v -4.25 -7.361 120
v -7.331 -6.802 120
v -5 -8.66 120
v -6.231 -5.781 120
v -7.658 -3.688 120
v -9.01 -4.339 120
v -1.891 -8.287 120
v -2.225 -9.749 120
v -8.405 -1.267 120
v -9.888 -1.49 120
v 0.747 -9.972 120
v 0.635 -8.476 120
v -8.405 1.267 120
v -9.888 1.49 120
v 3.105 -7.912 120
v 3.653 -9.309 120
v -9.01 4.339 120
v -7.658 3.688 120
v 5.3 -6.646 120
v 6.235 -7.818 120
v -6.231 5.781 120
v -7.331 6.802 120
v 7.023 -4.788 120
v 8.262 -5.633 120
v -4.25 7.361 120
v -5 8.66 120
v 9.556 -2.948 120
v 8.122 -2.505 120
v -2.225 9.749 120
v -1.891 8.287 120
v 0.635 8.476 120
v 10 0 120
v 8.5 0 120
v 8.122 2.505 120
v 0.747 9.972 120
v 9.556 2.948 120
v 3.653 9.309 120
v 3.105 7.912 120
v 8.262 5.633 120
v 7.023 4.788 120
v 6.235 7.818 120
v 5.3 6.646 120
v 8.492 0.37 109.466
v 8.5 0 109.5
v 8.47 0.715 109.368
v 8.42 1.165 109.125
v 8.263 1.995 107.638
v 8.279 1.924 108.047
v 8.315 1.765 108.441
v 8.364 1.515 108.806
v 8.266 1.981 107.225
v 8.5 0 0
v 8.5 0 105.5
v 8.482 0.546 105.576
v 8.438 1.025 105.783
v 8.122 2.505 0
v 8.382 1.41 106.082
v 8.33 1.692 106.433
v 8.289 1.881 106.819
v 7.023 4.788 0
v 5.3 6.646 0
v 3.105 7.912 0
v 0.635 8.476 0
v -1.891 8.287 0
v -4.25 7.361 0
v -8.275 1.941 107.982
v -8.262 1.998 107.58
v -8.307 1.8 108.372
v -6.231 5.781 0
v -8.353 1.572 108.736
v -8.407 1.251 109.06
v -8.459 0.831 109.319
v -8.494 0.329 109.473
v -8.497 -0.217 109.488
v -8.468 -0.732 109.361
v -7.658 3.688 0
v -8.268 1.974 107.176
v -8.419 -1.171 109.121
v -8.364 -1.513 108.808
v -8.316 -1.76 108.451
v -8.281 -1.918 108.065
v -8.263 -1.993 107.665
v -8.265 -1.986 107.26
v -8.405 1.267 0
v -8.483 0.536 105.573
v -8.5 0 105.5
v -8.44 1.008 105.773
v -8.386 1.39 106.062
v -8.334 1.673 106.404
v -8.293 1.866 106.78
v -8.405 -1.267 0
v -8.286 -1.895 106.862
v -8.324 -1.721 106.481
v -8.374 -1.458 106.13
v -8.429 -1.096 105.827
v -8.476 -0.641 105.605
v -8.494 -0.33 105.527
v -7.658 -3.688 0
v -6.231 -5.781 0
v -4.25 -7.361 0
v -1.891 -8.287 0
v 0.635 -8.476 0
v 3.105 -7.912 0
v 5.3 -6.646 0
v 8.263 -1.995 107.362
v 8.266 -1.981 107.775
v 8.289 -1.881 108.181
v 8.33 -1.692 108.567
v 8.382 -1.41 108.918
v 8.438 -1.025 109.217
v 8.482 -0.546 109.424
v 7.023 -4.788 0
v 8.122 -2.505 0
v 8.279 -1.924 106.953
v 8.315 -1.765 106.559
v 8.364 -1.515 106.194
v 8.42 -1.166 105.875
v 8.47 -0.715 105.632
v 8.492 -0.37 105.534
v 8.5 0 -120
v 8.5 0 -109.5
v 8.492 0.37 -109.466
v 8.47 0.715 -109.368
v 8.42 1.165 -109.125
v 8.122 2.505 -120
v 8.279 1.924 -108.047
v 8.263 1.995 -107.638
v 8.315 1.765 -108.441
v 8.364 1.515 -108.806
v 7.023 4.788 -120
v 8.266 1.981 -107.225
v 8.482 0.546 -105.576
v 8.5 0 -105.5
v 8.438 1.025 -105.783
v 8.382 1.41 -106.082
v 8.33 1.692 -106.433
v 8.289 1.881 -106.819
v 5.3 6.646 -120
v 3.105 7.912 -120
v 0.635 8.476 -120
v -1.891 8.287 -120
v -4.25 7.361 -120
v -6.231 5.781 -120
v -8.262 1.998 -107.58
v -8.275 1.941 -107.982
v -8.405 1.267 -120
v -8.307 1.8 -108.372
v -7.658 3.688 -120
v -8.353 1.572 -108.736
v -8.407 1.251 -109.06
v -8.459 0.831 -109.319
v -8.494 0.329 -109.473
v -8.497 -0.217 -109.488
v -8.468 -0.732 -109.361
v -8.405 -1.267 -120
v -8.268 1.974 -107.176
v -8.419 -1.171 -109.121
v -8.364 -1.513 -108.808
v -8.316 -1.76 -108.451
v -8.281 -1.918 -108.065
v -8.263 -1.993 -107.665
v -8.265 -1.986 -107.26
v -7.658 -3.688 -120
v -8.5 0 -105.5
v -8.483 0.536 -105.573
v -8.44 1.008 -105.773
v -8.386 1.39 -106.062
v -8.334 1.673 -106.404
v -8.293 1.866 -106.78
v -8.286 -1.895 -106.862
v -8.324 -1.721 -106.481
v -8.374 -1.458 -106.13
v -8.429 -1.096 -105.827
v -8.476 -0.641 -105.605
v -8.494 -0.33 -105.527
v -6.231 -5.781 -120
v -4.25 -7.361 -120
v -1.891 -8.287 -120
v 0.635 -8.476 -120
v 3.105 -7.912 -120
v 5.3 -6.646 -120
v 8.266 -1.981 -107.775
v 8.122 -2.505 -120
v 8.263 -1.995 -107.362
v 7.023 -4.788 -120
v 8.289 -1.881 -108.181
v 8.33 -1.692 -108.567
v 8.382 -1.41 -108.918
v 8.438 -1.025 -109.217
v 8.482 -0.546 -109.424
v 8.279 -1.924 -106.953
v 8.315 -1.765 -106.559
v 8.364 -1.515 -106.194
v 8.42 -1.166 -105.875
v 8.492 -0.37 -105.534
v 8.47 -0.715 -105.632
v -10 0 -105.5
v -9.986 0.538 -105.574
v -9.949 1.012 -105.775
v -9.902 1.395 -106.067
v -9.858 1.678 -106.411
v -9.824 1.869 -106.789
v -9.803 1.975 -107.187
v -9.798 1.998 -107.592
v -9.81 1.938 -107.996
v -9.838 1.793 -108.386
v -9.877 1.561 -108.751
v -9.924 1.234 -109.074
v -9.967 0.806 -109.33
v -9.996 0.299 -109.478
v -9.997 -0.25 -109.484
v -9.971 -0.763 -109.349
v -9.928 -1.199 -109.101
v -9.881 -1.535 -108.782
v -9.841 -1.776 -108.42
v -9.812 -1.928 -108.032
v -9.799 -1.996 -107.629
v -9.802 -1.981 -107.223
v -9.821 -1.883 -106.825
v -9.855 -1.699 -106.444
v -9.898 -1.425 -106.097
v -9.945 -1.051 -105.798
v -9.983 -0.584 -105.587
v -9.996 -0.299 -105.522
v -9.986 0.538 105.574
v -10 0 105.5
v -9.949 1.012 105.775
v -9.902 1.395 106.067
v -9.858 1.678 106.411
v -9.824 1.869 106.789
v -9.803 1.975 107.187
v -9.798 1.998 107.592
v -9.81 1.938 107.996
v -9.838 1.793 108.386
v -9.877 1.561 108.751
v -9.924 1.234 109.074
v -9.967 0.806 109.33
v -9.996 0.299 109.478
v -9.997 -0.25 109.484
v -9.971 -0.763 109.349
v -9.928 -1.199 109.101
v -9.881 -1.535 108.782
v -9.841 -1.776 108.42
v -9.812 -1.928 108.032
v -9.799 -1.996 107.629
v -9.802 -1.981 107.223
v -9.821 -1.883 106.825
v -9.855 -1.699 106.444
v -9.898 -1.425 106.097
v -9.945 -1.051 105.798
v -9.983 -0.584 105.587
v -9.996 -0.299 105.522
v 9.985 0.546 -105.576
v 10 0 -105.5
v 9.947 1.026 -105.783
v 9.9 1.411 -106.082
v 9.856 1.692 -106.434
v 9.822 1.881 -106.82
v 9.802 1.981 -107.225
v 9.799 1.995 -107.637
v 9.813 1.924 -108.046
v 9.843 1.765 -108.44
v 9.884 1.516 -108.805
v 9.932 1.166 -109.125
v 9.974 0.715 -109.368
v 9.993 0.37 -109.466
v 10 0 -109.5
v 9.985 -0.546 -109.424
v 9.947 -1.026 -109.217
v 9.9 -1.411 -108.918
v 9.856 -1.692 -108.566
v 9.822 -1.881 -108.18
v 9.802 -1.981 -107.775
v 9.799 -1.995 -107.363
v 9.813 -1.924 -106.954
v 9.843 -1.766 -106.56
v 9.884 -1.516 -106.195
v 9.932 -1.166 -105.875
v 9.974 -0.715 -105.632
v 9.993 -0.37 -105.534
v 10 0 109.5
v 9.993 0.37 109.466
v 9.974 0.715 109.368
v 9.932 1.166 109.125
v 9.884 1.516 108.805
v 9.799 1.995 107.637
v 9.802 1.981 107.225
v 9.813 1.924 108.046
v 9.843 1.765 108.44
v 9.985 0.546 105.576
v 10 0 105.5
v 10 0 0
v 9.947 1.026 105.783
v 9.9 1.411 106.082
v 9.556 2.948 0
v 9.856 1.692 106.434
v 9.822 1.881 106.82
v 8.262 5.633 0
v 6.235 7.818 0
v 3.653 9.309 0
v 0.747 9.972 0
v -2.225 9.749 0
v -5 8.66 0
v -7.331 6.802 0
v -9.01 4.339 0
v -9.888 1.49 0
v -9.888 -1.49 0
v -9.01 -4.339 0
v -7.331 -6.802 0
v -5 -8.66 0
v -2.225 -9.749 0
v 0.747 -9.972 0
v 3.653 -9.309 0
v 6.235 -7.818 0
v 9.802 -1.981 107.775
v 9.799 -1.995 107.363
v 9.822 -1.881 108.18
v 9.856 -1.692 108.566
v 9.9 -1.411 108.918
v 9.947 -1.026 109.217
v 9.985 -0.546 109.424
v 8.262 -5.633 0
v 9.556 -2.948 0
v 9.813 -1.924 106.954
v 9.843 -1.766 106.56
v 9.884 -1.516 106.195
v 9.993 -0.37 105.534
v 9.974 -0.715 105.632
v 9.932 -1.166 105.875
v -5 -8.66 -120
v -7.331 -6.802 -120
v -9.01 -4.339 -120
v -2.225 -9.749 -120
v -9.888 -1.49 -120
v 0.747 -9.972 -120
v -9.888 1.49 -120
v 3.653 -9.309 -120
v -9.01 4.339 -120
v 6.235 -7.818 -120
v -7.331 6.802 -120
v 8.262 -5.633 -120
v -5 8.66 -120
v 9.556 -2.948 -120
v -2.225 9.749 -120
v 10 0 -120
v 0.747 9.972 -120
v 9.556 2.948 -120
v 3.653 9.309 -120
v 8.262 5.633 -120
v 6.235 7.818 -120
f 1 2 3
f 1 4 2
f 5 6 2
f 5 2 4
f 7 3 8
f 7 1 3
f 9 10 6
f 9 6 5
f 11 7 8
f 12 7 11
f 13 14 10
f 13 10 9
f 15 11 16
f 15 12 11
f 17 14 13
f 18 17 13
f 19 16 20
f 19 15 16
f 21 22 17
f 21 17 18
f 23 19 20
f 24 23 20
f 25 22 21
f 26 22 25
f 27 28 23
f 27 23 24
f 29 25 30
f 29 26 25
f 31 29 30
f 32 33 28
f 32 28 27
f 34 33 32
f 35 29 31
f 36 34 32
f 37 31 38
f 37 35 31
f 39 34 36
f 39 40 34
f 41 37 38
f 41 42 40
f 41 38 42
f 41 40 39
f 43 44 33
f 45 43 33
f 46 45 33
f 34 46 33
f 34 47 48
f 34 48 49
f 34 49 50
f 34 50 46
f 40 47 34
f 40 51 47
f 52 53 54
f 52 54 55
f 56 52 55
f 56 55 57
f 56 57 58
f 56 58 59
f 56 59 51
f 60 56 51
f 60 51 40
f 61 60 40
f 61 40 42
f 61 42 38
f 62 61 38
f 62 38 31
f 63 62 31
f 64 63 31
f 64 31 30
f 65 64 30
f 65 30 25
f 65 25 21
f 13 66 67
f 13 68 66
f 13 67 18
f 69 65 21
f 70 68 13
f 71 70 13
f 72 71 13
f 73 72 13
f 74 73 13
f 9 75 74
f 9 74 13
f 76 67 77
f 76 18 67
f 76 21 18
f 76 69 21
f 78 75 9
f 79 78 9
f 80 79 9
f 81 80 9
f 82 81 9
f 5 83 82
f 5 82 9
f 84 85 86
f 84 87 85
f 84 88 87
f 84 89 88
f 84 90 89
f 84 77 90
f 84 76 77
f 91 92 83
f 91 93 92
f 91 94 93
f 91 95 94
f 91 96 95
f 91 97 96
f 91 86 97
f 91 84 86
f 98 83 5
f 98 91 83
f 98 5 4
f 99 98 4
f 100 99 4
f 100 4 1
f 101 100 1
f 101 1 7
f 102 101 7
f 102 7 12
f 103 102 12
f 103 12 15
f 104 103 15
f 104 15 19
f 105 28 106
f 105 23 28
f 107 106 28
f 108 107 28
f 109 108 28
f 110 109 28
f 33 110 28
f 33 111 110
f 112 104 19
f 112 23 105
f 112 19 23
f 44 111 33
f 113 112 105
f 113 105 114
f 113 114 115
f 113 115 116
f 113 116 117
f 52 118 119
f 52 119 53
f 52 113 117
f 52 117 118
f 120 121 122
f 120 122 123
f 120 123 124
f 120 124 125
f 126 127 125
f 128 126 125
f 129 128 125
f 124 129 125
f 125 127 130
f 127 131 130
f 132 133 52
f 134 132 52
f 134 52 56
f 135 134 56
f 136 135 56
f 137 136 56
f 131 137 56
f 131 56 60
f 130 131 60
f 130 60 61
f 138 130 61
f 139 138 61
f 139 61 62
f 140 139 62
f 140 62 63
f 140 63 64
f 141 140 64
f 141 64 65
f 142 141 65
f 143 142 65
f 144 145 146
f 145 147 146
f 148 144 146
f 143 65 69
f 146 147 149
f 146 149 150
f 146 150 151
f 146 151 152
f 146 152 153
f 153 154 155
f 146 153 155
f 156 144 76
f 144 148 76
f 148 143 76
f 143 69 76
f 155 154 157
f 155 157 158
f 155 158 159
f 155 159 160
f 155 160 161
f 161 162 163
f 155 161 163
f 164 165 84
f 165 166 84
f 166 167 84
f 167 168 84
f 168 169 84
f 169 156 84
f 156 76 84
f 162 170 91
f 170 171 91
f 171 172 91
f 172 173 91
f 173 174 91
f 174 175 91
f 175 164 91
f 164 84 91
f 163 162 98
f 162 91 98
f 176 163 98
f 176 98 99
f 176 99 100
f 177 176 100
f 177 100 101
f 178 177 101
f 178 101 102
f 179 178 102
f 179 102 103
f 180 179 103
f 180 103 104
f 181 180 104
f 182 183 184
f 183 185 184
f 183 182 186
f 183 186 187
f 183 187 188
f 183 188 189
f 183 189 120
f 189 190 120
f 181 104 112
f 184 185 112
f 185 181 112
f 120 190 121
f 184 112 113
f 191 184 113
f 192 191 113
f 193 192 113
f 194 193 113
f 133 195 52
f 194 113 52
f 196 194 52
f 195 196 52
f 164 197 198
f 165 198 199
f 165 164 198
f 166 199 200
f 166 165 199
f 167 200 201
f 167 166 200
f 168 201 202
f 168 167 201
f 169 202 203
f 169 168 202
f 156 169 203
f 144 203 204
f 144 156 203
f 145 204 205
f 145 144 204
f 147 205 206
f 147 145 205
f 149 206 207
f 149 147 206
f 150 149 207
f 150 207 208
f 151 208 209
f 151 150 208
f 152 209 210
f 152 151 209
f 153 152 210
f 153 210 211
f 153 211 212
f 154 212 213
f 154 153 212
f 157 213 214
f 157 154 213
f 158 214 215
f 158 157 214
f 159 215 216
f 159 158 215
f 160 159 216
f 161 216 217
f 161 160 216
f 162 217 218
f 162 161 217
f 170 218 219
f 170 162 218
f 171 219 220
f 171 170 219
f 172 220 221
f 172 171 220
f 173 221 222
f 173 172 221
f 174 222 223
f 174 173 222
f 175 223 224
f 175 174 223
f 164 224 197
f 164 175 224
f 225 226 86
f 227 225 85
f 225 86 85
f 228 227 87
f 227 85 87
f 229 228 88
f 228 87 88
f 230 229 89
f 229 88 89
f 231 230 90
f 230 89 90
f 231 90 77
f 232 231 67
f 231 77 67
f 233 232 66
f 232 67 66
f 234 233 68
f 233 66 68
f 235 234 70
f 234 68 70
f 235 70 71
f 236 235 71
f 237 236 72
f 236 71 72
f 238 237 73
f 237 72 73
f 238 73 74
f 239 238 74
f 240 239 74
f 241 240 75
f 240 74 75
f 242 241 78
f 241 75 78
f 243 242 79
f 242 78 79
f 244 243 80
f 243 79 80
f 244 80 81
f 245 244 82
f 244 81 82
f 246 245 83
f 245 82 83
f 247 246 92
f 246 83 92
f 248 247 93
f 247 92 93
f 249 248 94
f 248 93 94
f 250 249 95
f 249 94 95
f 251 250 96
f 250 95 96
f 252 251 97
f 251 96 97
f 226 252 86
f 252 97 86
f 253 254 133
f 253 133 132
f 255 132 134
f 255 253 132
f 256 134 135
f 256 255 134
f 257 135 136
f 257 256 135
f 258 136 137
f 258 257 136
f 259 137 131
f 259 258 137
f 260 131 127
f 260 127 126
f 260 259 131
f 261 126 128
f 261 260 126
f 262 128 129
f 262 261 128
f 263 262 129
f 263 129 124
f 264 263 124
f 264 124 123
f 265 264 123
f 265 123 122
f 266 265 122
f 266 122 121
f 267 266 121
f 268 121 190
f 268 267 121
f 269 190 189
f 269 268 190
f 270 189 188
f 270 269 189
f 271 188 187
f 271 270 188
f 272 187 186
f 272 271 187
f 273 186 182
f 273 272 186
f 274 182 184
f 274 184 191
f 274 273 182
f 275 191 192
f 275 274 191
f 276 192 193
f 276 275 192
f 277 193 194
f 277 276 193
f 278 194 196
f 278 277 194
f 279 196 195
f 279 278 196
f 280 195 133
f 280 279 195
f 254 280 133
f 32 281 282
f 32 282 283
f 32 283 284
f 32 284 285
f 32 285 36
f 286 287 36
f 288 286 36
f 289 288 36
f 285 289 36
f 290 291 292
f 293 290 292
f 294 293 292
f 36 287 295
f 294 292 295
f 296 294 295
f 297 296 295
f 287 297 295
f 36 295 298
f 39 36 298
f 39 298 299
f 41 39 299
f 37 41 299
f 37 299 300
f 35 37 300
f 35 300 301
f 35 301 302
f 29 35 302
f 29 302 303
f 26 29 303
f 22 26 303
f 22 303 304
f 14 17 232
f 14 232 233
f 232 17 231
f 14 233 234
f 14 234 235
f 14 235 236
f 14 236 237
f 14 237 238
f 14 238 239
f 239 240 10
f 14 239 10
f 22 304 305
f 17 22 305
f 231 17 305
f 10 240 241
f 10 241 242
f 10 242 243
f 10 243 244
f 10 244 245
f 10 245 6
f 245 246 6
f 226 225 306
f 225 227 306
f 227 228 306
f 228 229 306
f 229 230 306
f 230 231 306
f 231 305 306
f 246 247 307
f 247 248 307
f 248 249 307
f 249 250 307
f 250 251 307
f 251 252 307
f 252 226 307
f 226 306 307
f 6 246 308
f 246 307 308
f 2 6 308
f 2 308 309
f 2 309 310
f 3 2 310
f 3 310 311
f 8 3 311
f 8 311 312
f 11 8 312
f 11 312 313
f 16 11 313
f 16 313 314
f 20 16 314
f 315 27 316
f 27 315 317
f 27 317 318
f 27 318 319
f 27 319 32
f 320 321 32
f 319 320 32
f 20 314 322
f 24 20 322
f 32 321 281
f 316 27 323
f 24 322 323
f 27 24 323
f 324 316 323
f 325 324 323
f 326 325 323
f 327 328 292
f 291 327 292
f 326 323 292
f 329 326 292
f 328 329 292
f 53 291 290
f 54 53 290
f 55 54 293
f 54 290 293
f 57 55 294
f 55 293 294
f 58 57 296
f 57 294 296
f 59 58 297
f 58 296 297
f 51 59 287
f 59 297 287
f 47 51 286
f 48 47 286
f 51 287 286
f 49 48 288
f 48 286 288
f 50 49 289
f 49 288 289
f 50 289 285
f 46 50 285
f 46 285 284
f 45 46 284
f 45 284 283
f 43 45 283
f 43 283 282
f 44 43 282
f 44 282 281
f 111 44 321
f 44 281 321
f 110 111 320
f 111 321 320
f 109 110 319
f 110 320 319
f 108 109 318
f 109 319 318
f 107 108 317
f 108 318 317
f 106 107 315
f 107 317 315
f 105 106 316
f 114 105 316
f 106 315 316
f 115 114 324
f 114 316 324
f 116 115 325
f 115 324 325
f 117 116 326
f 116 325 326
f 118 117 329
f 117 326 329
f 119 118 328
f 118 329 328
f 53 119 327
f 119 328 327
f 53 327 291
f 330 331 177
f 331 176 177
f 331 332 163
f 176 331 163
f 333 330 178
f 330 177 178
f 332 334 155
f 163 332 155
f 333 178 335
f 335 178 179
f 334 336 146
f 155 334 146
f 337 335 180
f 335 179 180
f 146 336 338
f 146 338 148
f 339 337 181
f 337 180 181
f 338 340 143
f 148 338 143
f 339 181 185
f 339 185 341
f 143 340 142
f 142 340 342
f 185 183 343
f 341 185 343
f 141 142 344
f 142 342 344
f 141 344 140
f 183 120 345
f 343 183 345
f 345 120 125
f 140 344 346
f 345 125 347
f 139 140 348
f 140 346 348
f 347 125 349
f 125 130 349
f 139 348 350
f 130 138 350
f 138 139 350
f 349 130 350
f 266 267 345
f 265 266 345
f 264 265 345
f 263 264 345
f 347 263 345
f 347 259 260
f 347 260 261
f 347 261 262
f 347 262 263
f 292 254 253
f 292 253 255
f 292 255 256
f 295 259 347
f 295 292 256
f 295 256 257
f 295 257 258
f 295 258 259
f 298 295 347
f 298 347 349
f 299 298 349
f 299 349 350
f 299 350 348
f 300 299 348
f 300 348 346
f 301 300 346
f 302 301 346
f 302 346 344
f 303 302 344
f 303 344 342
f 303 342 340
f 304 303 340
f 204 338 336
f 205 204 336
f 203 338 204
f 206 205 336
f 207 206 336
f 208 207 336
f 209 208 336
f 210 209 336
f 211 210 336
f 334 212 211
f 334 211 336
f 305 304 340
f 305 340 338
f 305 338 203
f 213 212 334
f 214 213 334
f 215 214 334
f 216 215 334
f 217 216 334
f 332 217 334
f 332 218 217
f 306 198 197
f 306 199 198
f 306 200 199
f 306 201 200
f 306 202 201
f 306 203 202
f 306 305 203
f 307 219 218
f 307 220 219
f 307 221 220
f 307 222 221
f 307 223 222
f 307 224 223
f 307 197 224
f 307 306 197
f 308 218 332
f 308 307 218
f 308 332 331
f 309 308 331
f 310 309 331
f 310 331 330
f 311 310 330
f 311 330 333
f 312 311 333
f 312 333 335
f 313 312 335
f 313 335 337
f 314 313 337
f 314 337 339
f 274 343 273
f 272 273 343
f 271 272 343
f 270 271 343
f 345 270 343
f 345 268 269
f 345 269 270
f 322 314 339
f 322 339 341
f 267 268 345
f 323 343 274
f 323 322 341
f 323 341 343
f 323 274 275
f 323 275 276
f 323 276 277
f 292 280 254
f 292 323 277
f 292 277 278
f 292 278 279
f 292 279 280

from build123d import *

# Parameters (mm, degrees)
SKETCH1_R           = 10
SKETCH1_R_2         = 8.5
BOSS_EXTRUDE1_DEPTH = 120
SKETCH2_R           = 2
CUT_EXTRUDE1_DEPTH  = 121.830459736


with BuildPart() as part:
    # Sketch1 → Boss-Extrude1 (new body)
    with BuildSketch(Plane.XY):
        Circle(SKETCH1_R)
        Circle(SKETCH1_R_2, mode=Mode.SUBTRACT)
    boss_extrude1 = extrude(amount=BOSS_EXTRUDE1_DEPTH)

    # Sketch2 → Cut-Extrude1 (cut, symmetric)
    with BuildSketch(Plane(origin=(0, 0, 0), x_dir=(0, 0, -1), z_dir=(1, 0, 0))):
        with Locations((-107.5, 0)):
            Circle(SKETCH2_R)
    cut_extrude1 = extrude(amount=CUT_EXTRUDE1_DEPTH, both=True, mode=Mode.SUBTRACT)

    # Mirror1: Boss-Extrude1, Cut-Extrude1 across plane
    add(boss_extrude1.mirror(Plane.XY))
    add(cut_extrude1.mirror(Plane.XY), mode=Mode.SUBTRACT)


solid = part.part
